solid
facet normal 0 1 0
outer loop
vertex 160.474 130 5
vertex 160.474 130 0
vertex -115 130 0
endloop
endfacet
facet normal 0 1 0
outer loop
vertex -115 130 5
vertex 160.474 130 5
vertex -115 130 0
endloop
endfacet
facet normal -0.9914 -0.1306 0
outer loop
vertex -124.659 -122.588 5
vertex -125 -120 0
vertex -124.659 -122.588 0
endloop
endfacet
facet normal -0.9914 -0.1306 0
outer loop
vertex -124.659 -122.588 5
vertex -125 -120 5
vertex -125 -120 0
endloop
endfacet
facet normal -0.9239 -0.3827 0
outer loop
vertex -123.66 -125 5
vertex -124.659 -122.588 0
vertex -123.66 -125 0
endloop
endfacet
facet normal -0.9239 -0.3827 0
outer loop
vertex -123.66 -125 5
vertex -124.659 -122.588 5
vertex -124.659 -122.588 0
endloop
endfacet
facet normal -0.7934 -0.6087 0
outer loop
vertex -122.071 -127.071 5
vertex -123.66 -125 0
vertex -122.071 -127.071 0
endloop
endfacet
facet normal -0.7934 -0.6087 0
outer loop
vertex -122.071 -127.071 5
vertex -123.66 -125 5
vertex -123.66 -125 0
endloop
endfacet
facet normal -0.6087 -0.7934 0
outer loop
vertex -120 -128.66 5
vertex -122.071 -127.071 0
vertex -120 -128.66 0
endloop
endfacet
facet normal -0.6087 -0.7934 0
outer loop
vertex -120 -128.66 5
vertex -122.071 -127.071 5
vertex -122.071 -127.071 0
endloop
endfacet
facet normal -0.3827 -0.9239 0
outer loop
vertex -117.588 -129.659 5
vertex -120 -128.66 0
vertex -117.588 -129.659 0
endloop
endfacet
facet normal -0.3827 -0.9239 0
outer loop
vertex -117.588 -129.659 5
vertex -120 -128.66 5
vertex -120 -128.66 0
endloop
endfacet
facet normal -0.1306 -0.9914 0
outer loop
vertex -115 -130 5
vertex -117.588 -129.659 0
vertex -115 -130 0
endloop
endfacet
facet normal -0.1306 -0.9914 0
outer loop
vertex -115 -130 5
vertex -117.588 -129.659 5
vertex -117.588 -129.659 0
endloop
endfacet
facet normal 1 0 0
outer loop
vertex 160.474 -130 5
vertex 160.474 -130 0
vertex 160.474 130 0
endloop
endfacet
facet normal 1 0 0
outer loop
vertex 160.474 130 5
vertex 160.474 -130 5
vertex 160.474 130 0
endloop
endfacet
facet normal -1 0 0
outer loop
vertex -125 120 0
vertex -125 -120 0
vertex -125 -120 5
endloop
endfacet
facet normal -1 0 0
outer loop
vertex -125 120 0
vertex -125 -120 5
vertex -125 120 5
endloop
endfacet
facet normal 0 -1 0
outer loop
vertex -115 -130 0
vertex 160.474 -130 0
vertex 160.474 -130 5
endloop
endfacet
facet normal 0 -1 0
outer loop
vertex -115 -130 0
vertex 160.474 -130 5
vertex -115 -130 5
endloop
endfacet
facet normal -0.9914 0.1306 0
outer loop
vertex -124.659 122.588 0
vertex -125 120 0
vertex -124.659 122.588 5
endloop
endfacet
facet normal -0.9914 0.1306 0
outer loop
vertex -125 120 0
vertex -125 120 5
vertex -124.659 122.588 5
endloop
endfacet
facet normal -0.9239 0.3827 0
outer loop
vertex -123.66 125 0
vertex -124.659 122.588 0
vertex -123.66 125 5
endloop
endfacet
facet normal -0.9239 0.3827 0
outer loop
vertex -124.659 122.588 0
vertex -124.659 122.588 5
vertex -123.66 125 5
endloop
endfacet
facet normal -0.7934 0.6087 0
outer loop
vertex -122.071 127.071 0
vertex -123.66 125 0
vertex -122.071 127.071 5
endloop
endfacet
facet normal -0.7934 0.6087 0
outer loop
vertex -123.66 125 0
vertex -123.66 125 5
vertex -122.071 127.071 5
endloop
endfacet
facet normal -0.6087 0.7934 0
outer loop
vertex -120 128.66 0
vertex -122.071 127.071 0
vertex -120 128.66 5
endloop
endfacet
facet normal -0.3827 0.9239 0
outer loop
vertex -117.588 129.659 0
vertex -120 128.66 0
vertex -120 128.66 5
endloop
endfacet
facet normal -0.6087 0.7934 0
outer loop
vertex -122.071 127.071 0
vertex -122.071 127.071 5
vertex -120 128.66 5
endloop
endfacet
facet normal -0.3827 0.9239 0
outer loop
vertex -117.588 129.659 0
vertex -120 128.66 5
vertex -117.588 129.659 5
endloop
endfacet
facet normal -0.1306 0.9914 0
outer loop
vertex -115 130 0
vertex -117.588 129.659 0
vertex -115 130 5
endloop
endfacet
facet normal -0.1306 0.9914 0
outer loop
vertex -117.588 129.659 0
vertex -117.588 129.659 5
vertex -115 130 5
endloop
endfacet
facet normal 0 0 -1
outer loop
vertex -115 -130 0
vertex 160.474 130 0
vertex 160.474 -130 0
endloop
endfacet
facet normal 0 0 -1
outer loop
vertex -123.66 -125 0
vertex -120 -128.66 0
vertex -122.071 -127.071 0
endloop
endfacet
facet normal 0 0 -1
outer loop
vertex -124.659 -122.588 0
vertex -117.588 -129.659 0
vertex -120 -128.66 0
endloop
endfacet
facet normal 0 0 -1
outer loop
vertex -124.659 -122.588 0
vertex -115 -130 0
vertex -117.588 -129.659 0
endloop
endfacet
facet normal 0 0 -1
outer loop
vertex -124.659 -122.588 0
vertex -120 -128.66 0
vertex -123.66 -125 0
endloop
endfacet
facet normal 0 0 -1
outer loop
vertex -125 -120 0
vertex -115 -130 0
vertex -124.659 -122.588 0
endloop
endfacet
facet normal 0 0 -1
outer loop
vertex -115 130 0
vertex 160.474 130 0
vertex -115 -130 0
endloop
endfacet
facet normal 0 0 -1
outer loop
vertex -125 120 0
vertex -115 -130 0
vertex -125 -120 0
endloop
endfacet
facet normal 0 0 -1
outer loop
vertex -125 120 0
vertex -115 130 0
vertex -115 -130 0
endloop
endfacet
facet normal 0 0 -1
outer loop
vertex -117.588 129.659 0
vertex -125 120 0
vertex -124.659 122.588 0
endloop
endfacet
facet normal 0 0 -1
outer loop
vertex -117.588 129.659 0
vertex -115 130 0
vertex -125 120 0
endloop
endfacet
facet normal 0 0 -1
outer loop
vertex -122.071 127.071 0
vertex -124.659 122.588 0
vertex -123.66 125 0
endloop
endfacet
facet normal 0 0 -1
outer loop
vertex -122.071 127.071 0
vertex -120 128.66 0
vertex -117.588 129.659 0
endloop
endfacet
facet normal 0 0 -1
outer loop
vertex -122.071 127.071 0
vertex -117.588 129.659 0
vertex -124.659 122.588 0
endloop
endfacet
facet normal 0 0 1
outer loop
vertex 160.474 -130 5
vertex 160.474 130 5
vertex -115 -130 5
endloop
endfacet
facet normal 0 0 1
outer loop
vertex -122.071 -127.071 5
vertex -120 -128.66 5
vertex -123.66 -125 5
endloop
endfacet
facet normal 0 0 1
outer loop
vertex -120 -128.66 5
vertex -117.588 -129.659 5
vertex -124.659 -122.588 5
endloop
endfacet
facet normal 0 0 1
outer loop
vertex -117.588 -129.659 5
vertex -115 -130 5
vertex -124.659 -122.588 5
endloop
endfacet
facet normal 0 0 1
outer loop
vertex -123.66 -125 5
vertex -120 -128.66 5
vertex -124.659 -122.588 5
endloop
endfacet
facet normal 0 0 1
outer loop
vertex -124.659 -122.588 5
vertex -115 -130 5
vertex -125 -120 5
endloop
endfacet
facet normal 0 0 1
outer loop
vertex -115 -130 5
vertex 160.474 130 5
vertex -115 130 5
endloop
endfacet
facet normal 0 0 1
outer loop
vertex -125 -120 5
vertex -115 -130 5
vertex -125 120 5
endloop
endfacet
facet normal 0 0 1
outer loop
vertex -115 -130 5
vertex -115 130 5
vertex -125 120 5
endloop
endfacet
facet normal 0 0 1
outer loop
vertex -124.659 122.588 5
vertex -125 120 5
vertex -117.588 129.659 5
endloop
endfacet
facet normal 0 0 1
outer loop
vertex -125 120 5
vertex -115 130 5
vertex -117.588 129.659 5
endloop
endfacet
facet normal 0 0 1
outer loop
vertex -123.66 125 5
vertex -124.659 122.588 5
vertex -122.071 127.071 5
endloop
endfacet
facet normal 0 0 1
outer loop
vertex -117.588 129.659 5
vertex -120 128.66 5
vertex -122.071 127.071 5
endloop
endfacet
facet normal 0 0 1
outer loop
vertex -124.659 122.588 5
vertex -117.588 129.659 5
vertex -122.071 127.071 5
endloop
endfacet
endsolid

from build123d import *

# Parameters (mm, degrees)
SKETCH1_W           = 250
SKETCH1_H           = 260
BOSS_EXTRUDE1_DEPTH = 5
FILLET1_R           = 10
SKETCH2_W           = 35.474180531
SKETCH2_H           = 260
BOSS_EXTRUDE2_DEPTH = 5


with BuildPart() as part:
    # Sketch1 → Boss-Extrude1 (new body)
    with BuildSketch(Plane.XY):
        Rectangle(SKETCH1_W, SKETCH1_H)
    extrude(amount=BOSS_EXTRUDE1_DEPTH)

    # Fillet1
    fillet1_edges = [part.edges().sort_by_distance(p)[0] for p in [
        (-125, -130, 2.5),
        (-125, 130, 2.5),
    ]]
    fillet(fillet1_edges, radius=FILLET1_R)

    # Sketch2 → Boss-Extrude2 (add)
    with BuildSketch(Plane(origin=(0, 0, 0), x_dir=(-1, 0, 0), z_dir=(0, 0, -1))):
        with Locations((-142.737090266, 0)):
            Rectangle(SKETCH2_W, SKETCH2_H)
    extrude(amount=-BOSS_EXTRUDE2_DEPTH)


solid = part.part
